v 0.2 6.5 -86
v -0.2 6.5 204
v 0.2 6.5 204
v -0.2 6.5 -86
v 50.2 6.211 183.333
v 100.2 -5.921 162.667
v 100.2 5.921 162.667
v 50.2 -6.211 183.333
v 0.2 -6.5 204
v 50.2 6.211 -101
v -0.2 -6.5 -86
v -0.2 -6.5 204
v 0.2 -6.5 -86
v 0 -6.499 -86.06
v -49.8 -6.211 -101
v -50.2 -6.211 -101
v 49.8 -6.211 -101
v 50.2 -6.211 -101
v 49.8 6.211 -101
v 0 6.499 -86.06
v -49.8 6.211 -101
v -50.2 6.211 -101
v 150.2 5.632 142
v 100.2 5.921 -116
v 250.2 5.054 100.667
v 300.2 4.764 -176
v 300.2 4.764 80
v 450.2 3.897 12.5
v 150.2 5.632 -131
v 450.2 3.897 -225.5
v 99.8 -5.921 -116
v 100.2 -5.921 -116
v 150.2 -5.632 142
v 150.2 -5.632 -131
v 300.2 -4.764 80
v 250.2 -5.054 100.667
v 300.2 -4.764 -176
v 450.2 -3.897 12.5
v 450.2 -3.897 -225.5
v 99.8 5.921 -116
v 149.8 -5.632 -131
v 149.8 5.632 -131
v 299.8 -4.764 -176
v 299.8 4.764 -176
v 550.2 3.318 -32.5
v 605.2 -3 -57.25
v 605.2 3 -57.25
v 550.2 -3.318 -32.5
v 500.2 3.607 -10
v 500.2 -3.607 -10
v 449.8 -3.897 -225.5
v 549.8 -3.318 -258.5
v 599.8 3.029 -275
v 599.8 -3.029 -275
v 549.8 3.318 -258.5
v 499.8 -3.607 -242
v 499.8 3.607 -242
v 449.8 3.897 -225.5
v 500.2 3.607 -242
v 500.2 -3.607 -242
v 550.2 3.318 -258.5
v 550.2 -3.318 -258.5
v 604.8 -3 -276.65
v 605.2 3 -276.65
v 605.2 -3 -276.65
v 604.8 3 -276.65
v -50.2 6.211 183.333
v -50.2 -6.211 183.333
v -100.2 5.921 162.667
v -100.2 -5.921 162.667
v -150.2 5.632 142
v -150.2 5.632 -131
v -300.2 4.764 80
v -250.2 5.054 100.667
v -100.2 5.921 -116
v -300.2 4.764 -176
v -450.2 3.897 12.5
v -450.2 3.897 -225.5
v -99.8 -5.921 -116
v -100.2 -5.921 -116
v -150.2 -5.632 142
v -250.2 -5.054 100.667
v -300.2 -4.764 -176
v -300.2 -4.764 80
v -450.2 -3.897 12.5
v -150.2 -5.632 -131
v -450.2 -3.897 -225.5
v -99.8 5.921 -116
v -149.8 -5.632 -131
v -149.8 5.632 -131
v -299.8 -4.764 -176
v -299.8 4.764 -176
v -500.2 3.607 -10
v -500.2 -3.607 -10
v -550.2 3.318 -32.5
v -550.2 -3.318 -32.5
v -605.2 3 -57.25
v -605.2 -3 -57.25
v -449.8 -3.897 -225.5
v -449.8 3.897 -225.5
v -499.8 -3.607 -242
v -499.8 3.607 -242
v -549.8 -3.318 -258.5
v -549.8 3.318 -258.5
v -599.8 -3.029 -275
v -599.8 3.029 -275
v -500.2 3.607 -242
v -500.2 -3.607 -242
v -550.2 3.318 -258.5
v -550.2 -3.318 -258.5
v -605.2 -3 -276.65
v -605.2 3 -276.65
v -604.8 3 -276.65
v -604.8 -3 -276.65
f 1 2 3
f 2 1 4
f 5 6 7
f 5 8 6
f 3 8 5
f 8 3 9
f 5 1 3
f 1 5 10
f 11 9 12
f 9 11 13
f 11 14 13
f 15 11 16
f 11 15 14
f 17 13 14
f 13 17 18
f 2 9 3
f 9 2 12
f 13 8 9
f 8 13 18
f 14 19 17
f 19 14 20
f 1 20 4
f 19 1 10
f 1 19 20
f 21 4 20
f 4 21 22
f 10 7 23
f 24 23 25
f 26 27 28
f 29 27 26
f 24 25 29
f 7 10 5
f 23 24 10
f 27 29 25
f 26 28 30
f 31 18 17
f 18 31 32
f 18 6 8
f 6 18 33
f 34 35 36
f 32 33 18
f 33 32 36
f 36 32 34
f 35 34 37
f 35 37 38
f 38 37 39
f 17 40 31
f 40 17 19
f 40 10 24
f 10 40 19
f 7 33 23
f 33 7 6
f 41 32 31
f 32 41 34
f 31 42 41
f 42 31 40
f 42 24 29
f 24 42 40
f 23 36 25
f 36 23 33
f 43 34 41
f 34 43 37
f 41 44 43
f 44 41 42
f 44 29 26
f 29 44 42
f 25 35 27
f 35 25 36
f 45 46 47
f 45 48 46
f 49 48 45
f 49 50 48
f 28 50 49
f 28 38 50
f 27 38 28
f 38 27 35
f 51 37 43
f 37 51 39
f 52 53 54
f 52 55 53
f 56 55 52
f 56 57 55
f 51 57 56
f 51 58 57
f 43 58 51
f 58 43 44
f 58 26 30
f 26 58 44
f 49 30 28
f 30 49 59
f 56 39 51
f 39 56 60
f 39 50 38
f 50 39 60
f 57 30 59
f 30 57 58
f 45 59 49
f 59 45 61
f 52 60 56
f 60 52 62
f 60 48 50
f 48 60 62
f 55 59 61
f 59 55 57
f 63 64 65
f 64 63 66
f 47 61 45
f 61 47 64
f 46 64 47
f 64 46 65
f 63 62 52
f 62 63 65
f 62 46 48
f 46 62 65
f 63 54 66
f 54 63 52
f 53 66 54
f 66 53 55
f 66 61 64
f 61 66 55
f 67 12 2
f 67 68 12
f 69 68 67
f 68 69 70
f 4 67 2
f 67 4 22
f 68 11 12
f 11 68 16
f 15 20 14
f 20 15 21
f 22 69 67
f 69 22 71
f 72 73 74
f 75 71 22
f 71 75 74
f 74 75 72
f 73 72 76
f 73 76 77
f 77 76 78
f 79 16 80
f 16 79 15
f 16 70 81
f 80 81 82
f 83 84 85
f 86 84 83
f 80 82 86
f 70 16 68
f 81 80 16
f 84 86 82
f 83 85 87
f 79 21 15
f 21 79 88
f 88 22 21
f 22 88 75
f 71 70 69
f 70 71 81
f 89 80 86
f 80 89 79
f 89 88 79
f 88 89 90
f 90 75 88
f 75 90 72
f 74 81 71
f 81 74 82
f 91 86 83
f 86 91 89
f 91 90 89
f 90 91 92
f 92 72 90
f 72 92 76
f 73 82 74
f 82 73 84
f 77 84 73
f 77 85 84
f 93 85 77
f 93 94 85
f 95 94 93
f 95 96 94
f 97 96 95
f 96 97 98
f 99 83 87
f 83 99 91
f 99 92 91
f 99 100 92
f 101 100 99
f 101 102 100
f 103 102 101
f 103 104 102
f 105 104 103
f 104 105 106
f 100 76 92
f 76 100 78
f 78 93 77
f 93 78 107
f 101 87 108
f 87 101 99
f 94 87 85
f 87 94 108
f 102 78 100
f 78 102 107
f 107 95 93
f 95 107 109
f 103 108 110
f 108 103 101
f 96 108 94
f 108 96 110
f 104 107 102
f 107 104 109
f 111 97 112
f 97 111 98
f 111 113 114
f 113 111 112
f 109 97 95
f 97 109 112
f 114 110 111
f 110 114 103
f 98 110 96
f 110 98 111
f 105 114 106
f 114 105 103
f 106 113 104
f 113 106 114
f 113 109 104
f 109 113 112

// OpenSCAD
// Electric Kato style flying wing: swept wing with tip fins, a small pod and a pusher prop. Original work (CC0), NOT PicaSim's model (its meshes and
// textures need the authors' permission); the proportions follow the numbers in PicaSim's Aeroplane.xml for the Electric Kato (span 1.21 m, chord 0.29 m at the
// root and 0.22 m at the tip panel, 24 degrees of sweep, fins at the tips, pusher prop 0.16 m), see shared/picasim/katoDef.js.
// Units mm, native size (span 1210 mm); axes: x lateral, y up, z forward, origin at the centre of gravity, like esa_plane.scad. The client scales the whole
// plane by span / 1210. Export one part at a time:  openscad -D 'part="wing"' -o wing.stl kato.scad
// parts: fuselage, wing, tail, canopy, spinner, prop
part = "wing";

CG = 49;                          // the definition's origin is 49 mm ahead of the centre of gravity: z = definition x + CG
function lez(y) = y < 300 ? 155 - 124 * y / 300 : 31 - 135 * (y - 300) / 300;           // leading edge (definition x) at lateral position y
function tez(y) = y < 300 ? -135 - 90 * y / 300 : -225 - 99 * (y - 300) / 300;          // trailing edge
function thick(y) = 13 - 7 * y / 605;
module slice(y, t) { translate([y, 0, (lez(y) + tez(y)) / 2 + CG]) cube([0.4, thick(y) * t, lez(y) - tez(y)], center = true); }
module wing_half() { for (y = [0 : 50 : 550]) hull() { slice(y, 1); slice(y + 50, 1); } hull() { slice(550, 1); slice(605, 1); } }
module wing() { wing_half(); mirror([1, 0, 0]) wing_half(); }
module fin(sgn) {                  // vertical fin at the wing tip, trailing edge flush with the tip chord
  hull() {
    translate([sgn * 598, -55, tez(605) + 118 + CG - 120 + 50]) cube([3, 2, 120], center = true);
    translate([sgn * 598,  60, tez(605) +  75 + CG - 120 + 50]) cube([3, 2,  75], center = true);
  }
}
module tail() { fin(1); fin(-1); }
module fuselage() {                // small pod from the nose to just before the pusher prop
  hull() {
    translate([0, 0, 170 + CG]) scale([22, 20, 40]) sphere(1, $fn = 24);
    translate([0, 0, 30 + CG]) scale([32, 28, 90]) sphere(1, $fn = 24);
    translate([0, 0, -110 + CG]) scale([14, 12, 30]) sphere(1, $fn = 24);
  }
}
module canopy() { translate([0, 24, 70 + CG]) scale([20, 14, 60]) sphere(1, $fn = 24); }
module spinner() { translate([0, 0, -125 + CG - 6]) rotate([180, 0, 0]) cylinder(r1 = 14, r2 = 2, h = 24, $fn = 24); }     // cone pointing backwards behind the pod
module prop() {                    // 160 mm two-blade prop, hub at the origin, disc in the xy plane (the client moves it to z = -125 + CG - 6 - 4)
  for (a = [0, 180]) rotate([0, 0, a]) hull() { translate([6, 0, 0]) cylinder(r = 4, h = 2, $fn = 12); translate([78, 0, 0]) cylinder(r = 3, h = 1.5, $fn = 12); }
}
if (part == "fuselage") fuselage();
else if (part == "wing") wing();
else if (part == "tail") tail();
else if (part == "canopy") canopy();
else if (part == "spinner") spinner();
else if (part == "prop") prop();
